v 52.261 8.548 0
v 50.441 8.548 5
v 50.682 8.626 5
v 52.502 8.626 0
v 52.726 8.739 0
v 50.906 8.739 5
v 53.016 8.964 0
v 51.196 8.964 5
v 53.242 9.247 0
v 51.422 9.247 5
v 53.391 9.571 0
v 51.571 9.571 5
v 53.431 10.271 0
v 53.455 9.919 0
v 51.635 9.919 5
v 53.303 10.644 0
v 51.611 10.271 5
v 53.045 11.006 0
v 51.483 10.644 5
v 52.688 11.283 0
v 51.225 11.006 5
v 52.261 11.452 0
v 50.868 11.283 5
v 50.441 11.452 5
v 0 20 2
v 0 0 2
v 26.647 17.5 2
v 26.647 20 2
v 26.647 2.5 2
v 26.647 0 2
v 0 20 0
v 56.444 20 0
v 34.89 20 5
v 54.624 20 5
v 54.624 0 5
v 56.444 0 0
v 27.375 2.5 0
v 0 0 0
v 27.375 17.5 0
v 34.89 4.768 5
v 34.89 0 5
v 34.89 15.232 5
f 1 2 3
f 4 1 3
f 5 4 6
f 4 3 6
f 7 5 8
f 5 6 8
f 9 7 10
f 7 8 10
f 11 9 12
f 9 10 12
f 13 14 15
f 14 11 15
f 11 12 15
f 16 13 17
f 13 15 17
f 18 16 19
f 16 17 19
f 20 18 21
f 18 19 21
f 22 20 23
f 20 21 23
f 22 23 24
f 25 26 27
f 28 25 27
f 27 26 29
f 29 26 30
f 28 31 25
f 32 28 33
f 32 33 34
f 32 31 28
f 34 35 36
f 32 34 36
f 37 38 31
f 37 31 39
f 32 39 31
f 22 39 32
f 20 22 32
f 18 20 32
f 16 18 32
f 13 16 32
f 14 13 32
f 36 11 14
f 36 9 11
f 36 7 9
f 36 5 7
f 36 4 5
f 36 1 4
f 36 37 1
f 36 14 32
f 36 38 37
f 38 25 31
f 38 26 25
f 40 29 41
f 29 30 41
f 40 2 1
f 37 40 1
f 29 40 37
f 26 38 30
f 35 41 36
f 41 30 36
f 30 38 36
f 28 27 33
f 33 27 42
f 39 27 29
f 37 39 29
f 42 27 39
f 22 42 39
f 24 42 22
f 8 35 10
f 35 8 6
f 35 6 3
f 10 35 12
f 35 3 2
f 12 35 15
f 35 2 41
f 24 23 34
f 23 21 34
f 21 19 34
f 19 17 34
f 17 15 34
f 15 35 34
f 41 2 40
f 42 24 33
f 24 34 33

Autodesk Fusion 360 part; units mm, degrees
sketch "Sketch1" plane through (0, 0, 0) normal (0, 1, 0) x (1, 0, 0)
  line L0 (0, 0) -> (27, 0)
  line L1 (27, 0) -> (53, -9.4632)
  line L2 (53, -9.4632) -> (53, 0)
  line L3 (0, -2) -> (26.6473, -2)
  line L4 (26.6473, -2) -> (52.316, -11.3426)
  line L5 (53, -9.4632) -> (52.316, -11.3426)
  line L6 (0, -2) -> (0, 0)
  line L7 (53, 0) -> (27, 0)
  line L8 (53, -9.4632) -> (56.4443, 0)
  line L9 (56.4443, 0) -> (53, 0)
  dimension "d1" = 27
  dimension "d3" = 160
  dimension "d4" = 26
  dimension "d5" = 2
extrude "Extrude1" add sketch "Sketch1" along normal blind 20
sketch "Sketch2" plane through (2.4744, 0, -6.7982) normal (-0.342, 0, 0.9397) x (0, -1, 0)
  line L0 (0, 25.7244) -> (0, 53.0403)
  line L1 (0, 53.0403) -> (-20, 53.0403)
  line L2 (-20, 53.0403) -> (-20, 25.7244)
  line L3 (-20, 25.7244) -> (0, 25.7244)
  line L4 (-17.5, 25.7244) -> (-11.4522, 49.1091)
  line L5 (-8.5478, 49.1091) -> (-2.5, 25.7244)
  line L6 (-10, 25.7244) -> (-10, 53.0403)
  arc A0 (-8.5478, 49.1091) -> (-11.4522, 49.1091) centre (-10, 48.7335) ccw
  point P0 (-10, 54.7244)
  dimension "d8" = 7.5
  dimension "d9" = 7.5
  dimension "d10" = 29
  dimension "d11" = 1.5
extrude "Extrude2" cut sketch "Sketch2" against normal blind 15 contours L3 L5 L6 A0 | L3 L4 L6 A0
sketch "Sketch3" plane through (0, 20, 0) normal (0, 1, 0) x (-1, 0, 0)
  line L0 (-52.316, 11.3426) -> (-56.4443, 0)
  line L1 (-56.4443, 0) -> (0, 0)
  line L2 (0, 0) -> (0, 2)
  line L3 (0, 2) -> (-26.6473, 2)
  line L4 (-26.6473, 2) -> (-52.316, 11.3426)
  line L5 (-56.4443, 5) -> (-17.3231, 5)
  line L6 (-17.3231, 5) -> (-17.3231, 14.1022)
  line L7 (-17.3231, 14.1022) -> (-56.4443, 14.1022)
  line L8 (-56.4443, 14.1022) -> (-56.4443, 5)
  line L9 (-56.4443, 0) -> (-56.4443, 5)
  dimension "d14" = 5
extrude "Extrude3" cut sketch "Sketch3" against normal blind 86 contours L0 L4 L5 | L0 L4 L5 L6 L7 L8
equation "d9 = d8"
